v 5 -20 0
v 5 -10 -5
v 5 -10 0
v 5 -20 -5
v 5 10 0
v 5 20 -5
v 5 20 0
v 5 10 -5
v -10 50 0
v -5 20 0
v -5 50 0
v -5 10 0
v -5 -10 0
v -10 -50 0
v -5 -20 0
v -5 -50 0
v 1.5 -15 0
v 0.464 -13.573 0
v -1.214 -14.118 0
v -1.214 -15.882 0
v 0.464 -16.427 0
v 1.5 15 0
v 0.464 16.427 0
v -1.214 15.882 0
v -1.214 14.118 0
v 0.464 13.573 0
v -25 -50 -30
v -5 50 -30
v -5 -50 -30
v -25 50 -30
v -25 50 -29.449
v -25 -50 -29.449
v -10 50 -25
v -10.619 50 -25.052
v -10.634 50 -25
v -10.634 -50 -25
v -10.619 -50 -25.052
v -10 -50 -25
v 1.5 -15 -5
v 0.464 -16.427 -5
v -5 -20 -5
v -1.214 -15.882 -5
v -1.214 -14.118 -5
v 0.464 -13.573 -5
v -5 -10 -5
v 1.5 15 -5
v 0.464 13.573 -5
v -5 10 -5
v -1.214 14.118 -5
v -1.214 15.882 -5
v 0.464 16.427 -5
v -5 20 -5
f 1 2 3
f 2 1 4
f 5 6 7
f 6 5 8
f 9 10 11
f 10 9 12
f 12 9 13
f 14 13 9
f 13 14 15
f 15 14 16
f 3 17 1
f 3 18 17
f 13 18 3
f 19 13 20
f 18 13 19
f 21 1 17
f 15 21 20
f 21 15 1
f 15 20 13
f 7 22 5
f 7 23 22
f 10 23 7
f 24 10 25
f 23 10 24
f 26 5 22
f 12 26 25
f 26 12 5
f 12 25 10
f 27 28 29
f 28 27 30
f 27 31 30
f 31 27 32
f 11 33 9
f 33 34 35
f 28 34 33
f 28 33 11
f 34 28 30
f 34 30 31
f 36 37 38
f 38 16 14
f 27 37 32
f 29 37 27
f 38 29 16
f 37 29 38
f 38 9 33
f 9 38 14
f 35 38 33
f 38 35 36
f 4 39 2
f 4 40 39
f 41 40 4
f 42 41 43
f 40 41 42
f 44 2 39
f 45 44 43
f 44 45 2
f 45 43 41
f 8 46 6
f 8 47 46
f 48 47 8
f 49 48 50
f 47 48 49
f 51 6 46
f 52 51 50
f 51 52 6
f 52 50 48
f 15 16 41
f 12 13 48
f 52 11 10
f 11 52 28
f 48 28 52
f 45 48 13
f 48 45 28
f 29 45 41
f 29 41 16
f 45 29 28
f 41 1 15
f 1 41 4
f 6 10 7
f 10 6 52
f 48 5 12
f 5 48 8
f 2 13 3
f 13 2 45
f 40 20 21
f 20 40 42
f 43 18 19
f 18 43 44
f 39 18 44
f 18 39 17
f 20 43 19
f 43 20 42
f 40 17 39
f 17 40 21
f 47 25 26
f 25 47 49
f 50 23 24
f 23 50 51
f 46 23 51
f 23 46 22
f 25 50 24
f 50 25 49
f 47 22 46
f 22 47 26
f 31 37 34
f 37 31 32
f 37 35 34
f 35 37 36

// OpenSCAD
difference()
{
    // Base
    translate([-25, -50, -30]) cube([30, 100, 30]);
    translate([-25, -50, -25]) cube([15, 100, 25]);
    translate([ -5, -50, -30]) cube([10, 100, 25]);
    
    // Pattes de fixations
    translate([ 0, -35, -2.5]) cube([10, 30, 5], true);
    translate([ 0,  35, -2.5]) cube([10, 30, 5], true);
    translate([ 0, 0, -2.5]) cube([10, 20, 5], true);
    translate([  0, -15, -5]) cylinder(h = 5, r = 1.5);
    translate([  0,  15, -5]) cylinder(h = 5, r = 1.5);
    
    // Forme
    translate([ -19, 0, -25]) rotate(a = [0,-17,0]) cube([16, 100, 5], true);
}
